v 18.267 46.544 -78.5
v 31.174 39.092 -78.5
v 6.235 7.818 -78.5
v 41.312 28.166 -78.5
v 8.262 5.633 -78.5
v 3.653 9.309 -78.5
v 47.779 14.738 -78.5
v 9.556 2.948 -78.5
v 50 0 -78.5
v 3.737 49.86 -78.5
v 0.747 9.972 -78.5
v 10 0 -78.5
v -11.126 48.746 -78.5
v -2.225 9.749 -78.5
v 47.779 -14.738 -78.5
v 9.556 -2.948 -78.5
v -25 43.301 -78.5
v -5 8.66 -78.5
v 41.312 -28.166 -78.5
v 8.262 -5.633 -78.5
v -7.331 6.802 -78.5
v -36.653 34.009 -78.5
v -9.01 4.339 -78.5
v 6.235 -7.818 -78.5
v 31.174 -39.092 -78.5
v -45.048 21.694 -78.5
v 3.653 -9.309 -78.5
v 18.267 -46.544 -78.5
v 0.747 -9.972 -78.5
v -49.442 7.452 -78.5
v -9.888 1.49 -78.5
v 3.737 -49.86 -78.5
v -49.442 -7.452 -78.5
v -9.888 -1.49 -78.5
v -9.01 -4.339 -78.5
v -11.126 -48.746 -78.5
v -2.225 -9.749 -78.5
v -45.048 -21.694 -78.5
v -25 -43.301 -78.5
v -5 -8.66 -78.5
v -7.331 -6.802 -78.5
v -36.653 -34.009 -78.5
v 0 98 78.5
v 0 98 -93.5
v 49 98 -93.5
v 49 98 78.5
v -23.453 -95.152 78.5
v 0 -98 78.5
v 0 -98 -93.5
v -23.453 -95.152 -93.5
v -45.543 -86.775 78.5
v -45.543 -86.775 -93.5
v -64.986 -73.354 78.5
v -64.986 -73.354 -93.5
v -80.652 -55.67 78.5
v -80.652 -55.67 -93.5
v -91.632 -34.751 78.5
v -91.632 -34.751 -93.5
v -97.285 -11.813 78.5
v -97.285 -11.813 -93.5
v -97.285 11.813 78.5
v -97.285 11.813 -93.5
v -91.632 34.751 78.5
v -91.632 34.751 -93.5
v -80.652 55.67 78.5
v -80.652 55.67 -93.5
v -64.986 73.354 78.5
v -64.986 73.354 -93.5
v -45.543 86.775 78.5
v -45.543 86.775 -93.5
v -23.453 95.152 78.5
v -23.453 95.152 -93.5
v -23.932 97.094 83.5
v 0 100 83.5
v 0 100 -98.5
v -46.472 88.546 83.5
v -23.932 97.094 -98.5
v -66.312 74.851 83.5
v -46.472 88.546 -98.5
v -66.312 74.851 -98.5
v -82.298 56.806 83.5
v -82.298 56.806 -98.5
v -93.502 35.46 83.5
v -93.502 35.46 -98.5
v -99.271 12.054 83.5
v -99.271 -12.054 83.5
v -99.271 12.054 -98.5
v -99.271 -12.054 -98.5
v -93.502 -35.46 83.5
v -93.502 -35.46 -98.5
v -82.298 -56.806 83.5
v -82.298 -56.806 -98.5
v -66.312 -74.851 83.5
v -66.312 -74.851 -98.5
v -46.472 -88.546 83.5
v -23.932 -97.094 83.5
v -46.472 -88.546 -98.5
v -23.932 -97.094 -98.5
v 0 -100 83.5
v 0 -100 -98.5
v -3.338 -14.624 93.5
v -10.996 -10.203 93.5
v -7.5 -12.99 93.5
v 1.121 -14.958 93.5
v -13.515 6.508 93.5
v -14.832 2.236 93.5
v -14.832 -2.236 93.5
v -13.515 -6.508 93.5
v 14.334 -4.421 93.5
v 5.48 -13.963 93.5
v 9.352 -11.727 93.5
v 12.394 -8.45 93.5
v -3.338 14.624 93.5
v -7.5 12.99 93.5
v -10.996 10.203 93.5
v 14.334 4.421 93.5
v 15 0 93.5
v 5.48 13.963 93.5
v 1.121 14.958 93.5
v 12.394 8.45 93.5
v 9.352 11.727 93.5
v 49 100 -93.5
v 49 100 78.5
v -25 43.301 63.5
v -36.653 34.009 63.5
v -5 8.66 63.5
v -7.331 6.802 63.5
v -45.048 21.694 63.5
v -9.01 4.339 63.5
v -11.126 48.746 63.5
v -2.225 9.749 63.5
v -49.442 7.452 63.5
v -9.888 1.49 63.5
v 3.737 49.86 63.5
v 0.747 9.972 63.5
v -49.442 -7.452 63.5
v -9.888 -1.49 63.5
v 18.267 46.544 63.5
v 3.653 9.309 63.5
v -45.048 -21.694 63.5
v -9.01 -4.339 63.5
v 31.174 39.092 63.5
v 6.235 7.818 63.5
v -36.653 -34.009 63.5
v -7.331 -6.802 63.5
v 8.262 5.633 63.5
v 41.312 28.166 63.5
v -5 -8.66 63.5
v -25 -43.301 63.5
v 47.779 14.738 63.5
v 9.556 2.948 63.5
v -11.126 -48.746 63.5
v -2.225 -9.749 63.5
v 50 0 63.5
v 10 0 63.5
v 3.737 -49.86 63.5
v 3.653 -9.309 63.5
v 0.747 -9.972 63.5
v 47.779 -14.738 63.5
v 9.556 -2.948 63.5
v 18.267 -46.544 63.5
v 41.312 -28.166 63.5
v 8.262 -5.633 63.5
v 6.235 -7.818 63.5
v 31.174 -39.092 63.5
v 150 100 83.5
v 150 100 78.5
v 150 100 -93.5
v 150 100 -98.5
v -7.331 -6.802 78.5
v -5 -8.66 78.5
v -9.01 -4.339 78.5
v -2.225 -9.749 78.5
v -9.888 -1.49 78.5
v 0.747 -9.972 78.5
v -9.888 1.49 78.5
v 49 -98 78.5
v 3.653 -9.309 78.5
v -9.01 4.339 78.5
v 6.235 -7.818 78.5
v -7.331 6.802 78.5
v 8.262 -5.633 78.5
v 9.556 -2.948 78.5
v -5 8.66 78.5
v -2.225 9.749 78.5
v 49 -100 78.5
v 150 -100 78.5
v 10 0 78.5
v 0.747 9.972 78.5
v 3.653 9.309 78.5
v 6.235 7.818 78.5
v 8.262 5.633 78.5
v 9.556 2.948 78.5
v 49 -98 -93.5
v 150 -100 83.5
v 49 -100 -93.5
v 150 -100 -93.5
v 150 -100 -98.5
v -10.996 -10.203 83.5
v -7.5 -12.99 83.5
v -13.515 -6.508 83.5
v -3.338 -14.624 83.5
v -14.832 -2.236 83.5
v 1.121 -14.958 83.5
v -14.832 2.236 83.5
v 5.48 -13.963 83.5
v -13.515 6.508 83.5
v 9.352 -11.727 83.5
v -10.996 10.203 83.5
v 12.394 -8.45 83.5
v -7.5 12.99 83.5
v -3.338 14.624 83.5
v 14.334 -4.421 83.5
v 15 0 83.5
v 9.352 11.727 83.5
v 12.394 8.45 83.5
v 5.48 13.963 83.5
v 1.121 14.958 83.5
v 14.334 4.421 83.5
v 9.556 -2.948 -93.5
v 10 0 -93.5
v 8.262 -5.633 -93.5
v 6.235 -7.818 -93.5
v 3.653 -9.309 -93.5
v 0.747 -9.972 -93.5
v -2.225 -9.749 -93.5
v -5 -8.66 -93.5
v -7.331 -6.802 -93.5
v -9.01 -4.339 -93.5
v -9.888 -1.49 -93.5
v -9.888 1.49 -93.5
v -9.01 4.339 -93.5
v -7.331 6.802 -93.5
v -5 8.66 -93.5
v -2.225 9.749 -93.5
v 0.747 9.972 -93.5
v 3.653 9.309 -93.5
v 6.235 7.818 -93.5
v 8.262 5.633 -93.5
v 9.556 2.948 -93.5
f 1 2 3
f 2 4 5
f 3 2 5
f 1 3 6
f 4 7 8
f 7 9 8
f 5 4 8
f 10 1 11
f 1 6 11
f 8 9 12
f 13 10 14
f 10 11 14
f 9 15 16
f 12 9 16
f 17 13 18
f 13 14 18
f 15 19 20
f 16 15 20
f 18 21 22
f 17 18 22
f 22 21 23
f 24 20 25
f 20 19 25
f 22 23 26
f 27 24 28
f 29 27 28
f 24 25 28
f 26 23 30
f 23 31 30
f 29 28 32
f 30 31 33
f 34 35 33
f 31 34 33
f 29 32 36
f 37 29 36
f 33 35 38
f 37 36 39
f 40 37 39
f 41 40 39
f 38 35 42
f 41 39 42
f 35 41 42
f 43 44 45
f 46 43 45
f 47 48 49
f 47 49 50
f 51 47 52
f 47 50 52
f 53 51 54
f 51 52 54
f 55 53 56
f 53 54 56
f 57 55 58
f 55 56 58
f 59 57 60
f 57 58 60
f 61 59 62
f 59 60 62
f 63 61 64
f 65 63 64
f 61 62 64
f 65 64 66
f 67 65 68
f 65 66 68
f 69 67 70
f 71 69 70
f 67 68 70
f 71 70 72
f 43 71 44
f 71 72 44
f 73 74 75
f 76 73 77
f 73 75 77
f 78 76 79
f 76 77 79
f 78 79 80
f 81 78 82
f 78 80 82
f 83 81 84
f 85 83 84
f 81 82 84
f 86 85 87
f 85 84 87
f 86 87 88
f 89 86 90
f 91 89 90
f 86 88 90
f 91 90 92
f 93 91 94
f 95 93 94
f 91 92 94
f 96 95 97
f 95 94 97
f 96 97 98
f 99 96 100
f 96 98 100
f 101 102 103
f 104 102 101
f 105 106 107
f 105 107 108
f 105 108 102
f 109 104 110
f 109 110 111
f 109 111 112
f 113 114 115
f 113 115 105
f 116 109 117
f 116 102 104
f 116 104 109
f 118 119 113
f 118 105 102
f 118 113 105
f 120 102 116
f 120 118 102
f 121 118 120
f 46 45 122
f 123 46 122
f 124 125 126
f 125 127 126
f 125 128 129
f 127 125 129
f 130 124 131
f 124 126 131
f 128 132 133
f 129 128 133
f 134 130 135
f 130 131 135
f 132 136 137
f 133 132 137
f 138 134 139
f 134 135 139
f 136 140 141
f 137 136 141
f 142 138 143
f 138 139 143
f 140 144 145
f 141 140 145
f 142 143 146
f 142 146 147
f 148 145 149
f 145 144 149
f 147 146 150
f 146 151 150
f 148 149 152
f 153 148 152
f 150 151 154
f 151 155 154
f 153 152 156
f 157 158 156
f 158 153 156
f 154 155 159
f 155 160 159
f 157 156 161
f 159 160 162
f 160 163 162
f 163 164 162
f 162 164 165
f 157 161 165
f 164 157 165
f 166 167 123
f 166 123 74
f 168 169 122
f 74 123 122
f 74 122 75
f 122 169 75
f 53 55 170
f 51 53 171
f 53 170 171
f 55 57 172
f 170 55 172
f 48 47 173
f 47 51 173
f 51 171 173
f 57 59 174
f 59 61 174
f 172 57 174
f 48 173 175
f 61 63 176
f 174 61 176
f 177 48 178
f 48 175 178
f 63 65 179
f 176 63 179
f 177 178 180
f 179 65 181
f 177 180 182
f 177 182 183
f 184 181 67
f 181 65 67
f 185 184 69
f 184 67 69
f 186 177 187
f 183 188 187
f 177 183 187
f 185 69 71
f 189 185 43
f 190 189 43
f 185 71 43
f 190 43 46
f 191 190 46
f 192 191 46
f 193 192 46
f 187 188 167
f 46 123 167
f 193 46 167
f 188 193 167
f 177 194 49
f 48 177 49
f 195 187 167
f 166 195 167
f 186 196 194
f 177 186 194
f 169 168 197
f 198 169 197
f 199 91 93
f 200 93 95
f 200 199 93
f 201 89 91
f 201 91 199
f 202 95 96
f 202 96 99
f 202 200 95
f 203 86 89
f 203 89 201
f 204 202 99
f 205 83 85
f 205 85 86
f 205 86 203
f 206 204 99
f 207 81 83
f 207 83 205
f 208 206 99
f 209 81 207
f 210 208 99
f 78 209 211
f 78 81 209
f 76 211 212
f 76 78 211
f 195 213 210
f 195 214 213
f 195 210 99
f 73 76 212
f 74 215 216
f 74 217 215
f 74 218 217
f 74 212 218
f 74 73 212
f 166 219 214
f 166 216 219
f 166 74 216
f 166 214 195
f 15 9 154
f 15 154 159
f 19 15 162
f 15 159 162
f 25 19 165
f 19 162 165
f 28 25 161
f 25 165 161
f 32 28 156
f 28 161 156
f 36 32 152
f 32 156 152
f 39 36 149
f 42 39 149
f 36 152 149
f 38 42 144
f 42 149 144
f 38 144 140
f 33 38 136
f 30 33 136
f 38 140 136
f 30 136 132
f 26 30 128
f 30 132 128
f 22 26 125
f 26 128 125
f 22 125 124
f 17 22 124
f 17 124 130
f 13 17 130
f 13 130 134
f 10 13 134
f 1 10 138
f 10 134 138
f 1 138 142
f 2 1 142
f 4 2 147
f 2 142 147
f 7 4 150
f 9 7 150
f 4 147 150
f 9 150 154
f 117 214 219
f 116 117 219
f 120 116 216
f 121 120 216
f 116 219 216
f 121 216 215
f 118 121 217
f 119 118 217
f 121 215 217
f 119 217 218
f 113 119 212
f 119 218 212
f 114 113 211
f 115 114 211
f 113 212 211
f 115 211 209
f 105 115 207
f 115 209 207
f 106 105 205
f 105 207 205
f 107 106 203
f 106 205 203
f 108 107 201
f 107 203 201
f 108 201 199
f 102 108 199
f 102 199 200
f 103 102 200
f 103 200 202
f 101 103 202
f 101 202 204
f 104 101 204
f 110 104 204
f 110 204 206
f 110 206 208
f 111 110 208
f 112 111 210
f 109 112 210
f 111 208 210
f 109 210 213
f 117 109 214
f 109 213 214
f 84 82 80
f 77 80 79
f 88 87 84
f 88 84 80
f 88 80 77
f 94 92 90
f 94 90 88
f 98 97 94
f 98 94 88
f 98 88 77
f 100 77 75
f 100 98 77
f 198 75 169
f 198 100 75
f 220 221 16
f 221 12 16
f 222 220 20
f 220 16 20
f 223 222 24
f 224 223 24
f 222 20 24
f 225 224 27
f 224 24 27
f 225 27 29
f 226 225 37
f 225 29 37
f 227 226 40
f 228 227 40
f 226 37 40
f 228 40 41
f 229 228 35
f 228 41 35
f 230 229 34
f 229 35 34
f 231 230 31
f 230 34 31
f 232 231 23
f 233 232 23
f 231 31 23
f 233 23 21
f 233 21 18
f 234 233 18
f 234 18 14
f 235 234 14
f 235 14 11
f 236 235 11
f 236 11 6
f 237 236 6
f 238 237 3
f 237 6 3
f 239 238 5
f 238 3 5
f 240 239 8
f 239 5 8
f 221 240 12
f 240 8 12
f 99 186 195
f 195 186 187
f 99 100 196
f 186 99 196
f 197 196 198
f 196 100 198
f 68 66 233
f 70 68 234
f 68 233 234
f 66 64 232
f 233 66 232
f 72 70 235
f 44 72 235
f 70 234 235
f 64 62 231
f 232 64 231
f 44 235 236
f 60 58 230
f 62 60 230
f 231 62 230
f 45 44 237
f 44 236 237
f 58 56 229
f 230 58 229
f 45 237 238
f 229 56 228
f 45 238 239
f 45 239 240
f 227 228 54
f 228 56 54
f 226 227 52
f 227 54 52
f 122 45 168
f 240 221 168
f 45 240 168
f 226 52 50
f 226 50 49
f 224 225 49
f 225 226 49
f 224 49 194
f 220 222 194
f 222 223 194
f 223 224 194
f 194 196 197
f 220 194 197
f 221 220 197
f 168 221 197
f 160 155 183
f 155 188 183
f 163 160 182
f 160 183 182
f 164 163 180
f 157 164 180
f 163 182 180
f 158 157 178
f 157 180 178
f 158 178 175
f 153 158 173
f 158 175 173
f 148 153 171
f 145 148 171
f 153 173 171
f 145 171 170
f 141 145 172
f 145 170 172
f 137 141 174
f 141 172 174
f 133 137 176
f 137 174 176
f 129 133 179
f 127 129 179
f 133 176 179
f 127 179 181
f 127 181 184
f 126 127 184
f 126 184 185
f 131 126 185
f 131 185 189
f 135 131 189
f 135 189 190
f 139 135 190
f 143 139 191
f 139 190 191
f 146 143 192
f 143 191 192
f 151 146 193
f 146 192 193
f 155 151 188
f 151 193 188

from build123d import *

# Parameters (mm, degrees)
F4_DEPTH  = 5
F6_DEPTH  = 5
F8_DEPTH  = 172
F9_R      = 15
F10_DEPTH = 10


with BuildPart() as f2:
    # F0 (on Front) → F2 (revolve)
    with BuildSketch(Plane.XZ):
        Polygon((10, 78.5), (0, 78.5), (0, -93.5), (10, -93.5), (10, -78.5), (50, -78.5), (50, 63.5), (10, 63.5), align=None)
    revolve(axis=Axis((0, 0, -2.2203251719), (0, 0, -1)))

    # F3 (on face) → F4 (join)
    with BuildSketch(Plane.XY.offset(78.5)):
        with BuildLine():
            Line((150, 100), (0, 100))
            ThreePointArc((0, 100), (-100, 0), (0, -100))
            Line((0, -100), (150, -100))
            Line((150, -100), (150, 100))
        make_face()
    extrude(amount=F4_DEPTH)

    # F5 (on face) → F6 (join)
    with BuildSketch(Plane(origin=(0, 0, -93.5), x_dir=(1, 0, 0), z_dir=(0, 0, -1))):
        with BuildLine():
            ThreePointArc((0, 100), (-100, 0), (0, -100))
            Line((0, -100), (150, -100))
            Line((150, -100), (150, 100))
            Line((150, 100), (0, 100))
        make_face()
    extrude(amount=F6_DEPTH)

    # F7 (on face) → F8 (join, through all)
    with BuildSketch(Plane.XY.offset(-93.5)):
        with BuildLine():
            Line((49, 100), (0, 100))
            ThreePointArc((0, 100), (-100, 0), (0, -100))
            Line((0, -100), (49, -100))
            Line((49, -100), (49, -98))
            Line((49, -98), (0, -98))
            ThreePointArc((0, -98), (-98, 0), (0, 98))
            Line((0, 98), (49, 98))
            Line((49, 98), (49, 100))
        make_face()
    extrude(amount=F8_DEPTH)

    # F9 (on face) → F10 (join)
    with BuildSketch(Plane.XY.offset(83.5)):
        Circle(F9_R)
    extrude(amount=F10_DEPTH)


solid = f2.part
